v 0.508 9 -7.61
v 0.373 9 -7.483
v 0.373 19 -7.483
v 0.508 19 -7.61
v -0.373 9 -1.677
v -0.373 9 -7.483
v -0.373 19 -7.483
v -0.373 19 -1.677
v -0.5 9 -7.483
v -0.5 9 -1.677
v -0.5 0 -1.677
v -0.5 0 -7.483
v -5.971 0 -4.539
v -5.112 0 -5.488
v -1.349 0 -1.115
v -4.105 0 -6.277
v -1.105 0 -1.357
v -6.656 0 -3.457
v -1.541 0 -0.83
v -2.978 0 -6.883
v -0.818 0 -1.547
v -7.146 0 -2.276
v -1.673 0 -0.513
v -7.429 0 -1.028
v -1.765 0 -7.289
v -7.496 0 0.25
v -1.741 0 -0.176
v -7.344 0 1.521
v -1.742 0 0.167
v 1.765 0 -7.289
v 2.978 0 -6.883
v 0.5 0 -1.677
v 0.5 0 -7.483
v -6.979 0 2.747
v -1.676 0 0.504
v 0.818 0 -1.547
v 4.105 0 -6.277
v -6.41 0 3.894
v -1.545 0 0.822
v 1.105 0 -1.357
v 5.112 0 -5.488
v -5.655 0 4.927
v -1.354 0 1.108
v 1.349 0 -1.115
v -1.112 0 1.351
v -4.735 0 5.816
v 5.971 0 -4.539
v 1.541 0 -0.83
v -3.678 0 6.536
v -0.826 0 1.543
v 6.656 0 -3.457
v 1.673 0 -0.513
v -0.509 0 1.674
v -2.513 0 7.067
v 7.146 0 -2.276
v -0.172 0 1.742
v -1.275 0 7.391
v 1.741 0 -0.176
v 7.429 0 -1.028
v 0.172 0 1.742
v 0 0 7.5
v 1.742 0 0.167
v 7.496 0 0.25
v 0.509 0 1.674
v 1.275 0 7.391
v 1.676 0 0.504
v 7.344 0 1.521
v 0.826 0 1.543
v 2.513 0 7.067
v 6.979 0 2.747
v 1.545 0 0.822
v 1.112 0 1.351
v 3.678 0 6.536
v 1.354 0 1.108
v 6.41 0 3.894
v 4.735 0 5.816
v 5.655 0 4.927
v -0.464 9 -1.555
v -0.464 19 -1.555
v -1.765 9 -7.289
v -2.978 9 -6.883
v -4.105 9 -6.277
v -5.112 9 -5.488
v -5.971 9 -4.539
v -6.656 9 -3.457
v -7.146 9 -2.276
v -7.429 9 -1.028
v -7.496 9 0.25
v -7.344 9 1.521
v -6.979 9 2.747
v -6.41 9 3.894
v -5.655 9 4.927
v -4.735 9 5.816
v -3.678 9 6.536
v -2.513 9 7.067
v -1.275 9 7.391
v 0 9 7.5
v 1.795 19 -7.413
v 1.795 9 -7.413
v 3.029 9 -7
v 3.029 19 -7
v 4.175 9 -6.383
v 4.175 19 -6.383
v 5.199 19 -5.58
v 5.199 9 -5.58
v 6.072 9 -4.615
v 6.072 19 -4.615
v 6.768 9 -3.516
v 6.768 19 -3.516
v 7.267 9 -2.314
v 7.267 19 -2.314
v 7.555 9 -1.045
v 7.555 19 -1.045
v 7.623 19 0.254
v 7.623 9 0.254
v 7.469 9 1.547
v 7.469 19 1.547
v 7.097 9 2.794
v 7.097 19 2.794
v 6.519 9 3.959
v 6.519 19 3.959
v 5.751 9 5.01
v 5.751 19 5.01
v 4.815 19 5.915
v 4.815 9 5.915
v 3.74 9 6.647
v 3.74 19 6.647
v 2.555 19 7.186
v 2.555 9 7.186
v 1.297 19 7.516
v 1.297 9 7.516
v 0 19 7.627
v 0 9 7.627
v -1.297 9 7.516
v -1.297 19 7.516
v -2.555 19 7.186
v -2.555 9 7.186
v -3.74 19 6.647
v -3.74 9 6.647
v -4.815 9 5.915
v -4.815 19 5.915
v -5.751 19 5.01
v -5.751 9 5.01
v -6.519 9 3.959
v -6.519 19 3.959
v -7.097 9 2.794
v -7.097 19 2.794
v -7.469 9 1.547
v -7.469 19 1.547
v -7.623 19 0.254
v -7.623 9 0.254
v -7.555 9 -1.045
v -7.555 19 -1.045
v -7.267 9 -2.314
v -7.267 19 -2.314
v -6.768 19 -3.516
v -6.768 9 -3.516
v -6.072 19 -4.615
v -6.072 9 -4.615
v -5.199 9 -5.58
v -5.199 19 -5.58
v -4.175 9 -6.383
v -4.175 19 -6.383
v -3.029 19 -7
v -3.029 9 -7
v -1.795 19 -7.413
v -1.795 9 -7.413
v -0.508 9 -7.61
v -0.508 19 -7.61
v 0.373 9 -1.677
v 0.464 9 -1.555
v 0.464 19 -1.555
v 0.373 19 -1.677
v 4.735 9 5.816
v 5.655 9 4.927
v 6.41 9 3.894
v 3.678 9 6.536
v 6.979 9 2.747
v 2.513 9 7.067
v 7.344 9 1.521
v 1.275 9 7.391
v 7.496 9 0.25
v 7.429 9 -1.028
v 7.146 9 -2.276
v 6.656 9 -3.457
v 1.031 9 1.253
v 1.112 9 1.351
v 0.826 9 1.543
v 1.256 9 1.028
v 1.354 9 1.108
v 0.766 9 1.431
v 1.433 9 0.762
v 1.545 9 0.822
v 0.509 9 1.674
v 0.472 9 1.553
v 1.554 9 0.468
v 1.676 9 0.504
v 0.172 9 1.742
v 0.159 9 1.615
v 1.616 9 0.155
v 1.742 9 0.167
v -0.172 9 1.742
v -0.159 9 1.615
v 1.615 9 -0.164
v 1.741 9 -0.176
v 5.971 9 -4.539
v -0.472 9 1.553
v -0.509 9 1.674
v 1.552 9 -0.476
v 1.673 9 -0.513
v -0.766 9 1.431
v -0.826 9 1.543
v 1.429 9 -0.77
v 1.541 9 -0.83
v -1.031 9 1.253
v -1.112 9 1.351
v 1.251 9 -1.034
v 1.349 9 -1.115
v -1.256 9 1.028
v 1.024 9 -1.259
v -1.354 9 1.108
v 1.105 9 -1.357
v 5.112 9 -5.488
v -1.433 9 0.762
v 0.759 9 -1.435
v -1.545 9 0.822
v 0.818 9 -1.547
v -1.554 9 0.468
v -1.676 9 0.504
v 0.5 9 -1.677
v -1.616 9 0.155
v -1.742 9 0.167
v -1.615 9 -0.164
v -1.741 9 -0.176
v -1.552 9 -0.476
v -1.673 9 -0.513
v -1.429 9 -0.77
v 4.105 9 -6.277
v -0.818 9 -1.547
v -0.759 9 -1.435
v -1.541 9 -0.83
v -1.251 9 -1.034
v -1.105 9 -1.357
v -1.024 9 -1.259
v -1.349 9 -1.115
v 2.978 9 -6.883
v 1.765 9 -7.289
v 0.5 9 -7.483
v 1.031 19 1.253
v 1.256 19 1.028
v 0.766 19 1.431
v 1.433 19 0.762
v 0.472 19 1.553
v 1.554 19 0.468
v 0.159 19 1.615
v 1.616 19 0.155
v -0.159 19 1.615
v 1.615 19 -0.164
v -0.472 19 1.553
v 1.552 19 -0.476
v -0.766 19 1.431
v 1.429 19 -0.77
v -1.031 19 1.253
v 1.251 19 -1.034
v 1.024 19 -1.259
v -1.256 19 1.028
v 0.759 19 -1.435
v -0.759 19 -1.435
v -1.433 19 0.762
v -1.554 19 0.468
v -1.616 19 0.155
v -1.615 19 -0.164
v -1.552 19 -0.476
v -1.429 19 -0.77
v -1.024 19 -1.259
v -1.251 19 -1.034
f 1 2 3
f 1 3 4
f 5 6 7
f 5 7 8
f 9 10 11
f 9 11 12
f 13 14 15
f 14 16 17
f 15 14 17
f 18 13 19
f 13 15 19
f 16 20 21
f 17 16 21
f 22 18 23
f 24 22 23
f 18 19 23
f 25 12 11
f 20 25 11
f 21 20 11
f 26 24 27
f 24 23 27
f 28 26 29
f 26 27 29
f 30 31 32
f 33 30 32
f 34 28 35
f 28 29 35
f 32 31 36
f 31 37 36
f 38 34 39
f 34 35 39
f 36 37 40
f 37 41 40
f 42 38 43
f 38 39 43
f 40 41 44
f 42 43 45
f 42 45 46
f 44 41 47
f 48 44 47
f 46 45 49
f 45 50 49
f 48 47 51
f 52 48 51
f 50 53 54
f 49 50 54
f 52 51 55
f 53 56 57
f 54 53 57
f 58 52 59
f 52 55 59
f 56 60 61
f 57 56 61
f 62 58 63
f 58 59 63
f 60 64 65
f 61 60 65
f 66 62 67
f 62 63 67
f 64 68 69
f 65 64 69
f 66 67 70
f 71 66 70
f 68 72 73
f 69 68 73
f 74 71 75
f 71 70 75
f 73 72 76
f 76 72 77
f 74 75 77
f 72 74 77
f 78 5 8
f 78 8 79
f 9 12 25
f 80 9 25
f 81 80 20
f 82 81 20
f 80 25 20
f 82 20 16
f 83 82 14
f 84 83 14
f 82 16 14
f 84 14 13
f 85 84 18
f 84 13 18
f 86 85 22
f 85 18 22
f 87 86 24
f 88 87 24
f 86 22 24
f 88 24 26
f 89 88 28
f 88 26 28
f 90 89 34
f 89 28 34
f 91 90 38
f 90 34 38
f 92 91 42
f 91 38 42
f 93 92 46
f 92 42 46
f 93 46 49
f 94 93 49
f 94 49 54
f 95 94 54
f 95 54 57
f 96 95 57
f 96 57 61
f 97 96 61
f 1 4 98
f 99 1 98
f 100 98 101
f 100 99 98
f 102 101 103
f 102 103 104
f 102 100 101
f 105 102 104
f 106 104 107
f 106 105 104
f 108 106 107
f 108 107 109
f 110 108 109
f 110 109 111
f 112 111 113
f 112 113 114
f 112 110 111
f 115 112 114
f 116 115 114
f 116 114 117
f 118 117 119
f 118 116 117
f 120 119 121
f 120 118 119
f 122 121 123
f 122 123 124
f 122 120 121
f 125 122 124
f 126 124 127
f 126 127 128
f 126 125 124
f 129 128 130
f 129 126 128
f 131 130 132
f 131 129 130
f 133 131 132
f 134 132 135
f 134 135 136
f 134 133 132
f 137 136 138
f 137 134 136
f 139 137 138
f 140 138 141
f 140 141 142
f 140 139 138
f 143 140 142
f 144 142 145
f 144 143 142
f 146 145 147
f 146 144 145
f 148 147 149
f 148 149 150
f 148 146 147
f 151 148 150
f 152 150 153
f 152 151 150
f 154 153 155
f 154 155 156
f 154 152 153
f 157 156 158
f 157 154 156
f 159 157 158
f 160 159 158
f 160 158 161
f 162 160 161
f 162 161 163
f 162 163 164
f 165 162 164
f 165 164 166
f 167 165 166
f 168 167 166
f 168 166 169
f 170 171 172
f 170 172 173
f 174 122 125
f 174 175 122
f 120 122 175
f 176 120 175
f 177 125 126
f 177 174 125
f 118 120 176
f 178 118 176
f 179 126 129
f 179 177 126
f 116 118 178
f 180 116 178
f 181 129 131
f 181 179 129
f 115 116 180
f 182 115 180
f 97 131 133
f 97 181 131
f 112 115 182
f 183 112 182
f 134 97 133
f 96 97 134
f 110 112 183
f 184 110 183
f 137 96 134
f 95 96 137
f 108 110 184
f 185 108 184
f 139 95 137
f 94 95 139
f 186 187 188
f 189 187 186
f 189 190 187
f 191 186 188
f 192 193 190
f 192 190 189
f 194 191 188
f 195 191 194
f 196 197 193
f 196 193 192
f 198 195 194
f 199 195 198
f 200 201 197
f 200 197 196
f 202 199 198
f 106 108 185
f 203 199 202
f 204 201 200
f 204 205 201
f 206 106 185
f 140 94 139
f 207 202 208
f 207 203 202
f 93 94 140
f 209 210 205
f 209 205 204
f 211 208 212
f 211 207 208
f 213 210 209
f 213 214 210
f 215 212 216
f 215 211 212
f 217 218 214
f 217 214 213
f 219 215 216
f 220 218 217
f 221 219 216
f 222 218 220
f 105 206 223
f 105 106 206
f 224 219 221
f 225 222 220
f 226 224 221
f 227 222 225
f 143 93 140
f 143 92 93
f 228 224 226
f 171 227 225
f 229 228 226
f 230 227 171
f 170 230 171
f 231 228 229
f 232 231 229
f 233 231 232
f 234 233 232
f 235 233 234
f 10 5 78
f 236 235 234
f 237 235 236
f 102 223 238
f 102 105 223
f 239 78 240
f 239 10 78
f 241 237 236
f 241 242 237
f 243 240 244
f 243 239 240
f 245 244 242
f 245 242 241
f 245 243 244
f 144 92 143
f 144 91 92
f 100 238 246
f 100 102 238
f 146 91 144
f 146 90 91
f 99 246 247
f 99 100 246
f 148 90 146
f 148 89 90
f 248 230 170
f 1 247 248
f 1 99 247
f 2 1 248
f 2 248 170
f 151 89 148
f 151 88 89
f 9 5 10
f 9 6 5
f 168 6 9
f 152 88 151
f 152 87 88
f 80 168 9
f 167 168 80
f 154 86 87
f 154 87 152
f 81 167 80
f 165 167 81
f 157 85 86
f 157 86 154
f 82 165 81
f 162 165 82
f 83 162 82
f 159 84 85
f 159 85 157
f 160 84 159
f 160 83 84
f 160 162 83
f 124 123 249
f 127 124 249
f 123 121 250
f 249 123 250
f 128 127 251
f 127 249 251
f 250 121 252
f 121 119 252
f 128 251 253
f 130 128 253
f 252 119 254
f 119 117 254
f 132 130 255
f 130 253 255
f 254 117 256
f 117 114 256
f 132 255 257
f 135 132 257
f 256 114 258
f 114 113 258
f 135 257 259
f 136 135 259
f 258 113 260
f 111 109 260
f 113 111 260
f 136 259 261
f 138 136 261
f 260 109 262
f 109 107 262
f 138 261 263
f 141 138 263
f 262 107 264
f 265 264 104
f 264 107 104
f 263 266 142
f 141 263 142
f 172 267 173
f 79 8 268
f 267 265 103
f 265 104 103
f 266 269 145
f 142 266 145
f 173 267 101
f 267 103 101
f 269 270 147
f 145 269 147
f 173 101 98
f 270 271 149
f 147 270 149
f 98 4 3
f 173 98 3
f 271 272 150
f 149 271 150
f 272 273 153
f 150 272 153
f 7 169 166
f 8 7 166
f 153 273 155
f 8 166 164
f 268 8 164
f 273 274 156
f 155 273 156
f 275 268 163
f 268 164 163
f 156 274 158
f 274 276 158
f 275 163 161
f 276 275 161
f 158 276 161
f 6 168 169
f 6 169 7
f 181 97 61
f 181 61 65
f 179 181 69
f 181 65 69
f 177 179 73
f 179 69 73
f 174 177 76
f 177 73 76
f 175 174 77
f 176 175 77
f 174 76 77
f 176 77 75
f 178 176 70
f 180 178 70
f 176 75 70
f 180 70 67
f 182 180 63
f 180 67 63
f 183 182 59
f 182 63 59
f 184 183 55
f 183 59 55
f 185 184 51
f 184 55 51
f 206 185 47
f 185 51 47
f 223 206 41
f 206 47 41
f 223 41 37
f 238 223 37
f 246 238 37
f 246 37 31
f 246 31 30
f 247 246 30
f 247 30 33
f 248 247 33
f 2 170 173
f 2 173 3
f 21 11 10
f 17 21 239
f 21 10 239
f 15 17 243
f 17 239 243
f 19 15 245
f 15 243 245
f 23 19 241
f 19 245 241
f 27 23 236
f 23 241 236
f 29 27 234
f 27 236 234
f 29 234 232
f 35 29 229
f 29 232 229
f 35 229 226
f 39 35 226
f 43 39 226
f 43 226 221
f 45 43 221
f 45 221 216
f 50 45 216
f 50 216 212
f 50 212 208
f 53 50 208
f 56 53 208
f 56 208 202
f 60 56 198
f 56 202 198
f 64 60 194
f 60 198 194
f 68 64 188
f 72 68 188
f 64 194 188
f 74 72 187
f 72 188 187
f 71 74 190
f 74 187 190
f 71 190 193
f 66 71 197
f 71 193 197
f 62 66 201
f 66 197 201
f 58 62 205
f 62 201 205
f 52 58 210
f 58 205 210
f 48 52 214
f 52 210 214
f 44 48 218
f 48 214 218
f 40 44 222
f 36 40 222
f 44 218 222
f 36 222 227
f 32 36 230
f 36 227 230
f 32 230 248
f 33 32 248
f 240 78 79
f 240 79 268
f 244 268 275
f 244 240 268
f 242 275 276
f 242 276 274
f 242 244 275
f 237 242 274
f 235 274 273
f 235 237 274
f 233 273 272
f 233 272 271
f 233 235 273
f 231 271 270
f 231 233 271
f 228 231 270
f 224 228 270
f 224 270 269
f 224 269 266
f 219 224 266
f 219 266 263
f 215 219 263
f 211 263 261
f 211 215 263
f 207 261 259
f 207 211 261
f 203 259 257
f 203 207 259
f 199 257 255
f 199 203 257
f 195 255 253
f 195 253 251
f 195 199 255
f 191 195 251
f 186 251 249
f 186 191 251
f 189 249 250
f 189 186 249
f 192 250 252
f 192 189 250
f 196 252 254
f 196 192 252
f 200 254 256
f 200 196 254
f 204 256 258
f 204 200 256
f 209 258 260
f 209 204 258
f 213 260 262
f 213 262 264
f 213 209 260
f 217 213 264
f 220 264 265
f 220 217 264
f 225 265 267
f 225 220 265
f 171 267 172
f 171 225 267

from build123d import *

# Parameters (mm, degrees)
SKETCH1_R           = 7.5
BOSS_EXTRUDE1_DEPTH = 9
SKETCH2_R           = 1.75
CUT_EXTRUDE1_DEPTH  = 14.910427743
SKETCH4_W           = 1
SKETCH4_H           = 6.379821958
CUT_EXTRUDE2_DEPTH  = 9
BOSS_EXTRUDE2_DEPTH = 10


with BuildPart() as part:
    # Sketch1 → Boss-Extrude1 (new body)
    with BuildSketch(Plane(origin=(0, 0, 0), x_dir=(1, 0, 0), z_dir=(0, 1, 0))):
        Circle(SKETCH1_R)
    extrude(amount=BOSS_EXTRUDE1_DEPTH)

    # Sketch2 → Cut-Extrude1 (cut, through all)
    with BuildSketch(Plane(origin=(0, 9, 0), x_dir=(1, 0, 0), z_dir=(0, 1, 0))):
        Circle(SKETCH2_R)
    extrude(amount=-CUT_EXTRUDE1_DEPTH, mode=Mode.SUBTRACT)

    # Sketch4 → Cut-Extrude2 (cut)
    with BuildSketch(Plane(origin=(0, 9, 0), x_dir=(1, 0, 0), z_dir=(0, 1, 0))):
        with Locations((0, 4.574678536)):
            Rectangle(SKETCH4_W, SKETCH4_H)
    extrude(amount=-CUT_EXTRUDE2_DEPTH, mode=Mode.SUBTRACT)

    # Sketch5 → Boss-Extrude2 (add)
    with BuildSketch(Plane(origin=(0, 9, 0), x_dir=(1, 0, 0), z_dir=(0, 1, 0))):
        with BuildLine():
            Line((0.373, 7.483314774), (0.373, 1.677050983))
            Line((0.373, 1.677050983), (0.463714286, 1.555344997))
            ThreePointArc((0.463714286, 1.555344997), (0, -1.623), (-0.463714286, 1.555344997))
            Line((-0.463714286, 1.555344997), (-0.373, 1.677050983))
            Line((-0.373, 1.677050983), (-0.373, 7.483314774))
            Line((-0.373, 7.483314774), (-0.508466667, 7.610032237))
            ThreePointArc((-0.508466667, 7.610032237), (0, -7.627), (0.508466667, 7.610032237))
            Line((0.508466667, 7.610032237), (0.373, 7.483314774))
        make_face()
    extrude(amount=BOSS_EXTRUDE2_DEPTH)


solid = part.part
